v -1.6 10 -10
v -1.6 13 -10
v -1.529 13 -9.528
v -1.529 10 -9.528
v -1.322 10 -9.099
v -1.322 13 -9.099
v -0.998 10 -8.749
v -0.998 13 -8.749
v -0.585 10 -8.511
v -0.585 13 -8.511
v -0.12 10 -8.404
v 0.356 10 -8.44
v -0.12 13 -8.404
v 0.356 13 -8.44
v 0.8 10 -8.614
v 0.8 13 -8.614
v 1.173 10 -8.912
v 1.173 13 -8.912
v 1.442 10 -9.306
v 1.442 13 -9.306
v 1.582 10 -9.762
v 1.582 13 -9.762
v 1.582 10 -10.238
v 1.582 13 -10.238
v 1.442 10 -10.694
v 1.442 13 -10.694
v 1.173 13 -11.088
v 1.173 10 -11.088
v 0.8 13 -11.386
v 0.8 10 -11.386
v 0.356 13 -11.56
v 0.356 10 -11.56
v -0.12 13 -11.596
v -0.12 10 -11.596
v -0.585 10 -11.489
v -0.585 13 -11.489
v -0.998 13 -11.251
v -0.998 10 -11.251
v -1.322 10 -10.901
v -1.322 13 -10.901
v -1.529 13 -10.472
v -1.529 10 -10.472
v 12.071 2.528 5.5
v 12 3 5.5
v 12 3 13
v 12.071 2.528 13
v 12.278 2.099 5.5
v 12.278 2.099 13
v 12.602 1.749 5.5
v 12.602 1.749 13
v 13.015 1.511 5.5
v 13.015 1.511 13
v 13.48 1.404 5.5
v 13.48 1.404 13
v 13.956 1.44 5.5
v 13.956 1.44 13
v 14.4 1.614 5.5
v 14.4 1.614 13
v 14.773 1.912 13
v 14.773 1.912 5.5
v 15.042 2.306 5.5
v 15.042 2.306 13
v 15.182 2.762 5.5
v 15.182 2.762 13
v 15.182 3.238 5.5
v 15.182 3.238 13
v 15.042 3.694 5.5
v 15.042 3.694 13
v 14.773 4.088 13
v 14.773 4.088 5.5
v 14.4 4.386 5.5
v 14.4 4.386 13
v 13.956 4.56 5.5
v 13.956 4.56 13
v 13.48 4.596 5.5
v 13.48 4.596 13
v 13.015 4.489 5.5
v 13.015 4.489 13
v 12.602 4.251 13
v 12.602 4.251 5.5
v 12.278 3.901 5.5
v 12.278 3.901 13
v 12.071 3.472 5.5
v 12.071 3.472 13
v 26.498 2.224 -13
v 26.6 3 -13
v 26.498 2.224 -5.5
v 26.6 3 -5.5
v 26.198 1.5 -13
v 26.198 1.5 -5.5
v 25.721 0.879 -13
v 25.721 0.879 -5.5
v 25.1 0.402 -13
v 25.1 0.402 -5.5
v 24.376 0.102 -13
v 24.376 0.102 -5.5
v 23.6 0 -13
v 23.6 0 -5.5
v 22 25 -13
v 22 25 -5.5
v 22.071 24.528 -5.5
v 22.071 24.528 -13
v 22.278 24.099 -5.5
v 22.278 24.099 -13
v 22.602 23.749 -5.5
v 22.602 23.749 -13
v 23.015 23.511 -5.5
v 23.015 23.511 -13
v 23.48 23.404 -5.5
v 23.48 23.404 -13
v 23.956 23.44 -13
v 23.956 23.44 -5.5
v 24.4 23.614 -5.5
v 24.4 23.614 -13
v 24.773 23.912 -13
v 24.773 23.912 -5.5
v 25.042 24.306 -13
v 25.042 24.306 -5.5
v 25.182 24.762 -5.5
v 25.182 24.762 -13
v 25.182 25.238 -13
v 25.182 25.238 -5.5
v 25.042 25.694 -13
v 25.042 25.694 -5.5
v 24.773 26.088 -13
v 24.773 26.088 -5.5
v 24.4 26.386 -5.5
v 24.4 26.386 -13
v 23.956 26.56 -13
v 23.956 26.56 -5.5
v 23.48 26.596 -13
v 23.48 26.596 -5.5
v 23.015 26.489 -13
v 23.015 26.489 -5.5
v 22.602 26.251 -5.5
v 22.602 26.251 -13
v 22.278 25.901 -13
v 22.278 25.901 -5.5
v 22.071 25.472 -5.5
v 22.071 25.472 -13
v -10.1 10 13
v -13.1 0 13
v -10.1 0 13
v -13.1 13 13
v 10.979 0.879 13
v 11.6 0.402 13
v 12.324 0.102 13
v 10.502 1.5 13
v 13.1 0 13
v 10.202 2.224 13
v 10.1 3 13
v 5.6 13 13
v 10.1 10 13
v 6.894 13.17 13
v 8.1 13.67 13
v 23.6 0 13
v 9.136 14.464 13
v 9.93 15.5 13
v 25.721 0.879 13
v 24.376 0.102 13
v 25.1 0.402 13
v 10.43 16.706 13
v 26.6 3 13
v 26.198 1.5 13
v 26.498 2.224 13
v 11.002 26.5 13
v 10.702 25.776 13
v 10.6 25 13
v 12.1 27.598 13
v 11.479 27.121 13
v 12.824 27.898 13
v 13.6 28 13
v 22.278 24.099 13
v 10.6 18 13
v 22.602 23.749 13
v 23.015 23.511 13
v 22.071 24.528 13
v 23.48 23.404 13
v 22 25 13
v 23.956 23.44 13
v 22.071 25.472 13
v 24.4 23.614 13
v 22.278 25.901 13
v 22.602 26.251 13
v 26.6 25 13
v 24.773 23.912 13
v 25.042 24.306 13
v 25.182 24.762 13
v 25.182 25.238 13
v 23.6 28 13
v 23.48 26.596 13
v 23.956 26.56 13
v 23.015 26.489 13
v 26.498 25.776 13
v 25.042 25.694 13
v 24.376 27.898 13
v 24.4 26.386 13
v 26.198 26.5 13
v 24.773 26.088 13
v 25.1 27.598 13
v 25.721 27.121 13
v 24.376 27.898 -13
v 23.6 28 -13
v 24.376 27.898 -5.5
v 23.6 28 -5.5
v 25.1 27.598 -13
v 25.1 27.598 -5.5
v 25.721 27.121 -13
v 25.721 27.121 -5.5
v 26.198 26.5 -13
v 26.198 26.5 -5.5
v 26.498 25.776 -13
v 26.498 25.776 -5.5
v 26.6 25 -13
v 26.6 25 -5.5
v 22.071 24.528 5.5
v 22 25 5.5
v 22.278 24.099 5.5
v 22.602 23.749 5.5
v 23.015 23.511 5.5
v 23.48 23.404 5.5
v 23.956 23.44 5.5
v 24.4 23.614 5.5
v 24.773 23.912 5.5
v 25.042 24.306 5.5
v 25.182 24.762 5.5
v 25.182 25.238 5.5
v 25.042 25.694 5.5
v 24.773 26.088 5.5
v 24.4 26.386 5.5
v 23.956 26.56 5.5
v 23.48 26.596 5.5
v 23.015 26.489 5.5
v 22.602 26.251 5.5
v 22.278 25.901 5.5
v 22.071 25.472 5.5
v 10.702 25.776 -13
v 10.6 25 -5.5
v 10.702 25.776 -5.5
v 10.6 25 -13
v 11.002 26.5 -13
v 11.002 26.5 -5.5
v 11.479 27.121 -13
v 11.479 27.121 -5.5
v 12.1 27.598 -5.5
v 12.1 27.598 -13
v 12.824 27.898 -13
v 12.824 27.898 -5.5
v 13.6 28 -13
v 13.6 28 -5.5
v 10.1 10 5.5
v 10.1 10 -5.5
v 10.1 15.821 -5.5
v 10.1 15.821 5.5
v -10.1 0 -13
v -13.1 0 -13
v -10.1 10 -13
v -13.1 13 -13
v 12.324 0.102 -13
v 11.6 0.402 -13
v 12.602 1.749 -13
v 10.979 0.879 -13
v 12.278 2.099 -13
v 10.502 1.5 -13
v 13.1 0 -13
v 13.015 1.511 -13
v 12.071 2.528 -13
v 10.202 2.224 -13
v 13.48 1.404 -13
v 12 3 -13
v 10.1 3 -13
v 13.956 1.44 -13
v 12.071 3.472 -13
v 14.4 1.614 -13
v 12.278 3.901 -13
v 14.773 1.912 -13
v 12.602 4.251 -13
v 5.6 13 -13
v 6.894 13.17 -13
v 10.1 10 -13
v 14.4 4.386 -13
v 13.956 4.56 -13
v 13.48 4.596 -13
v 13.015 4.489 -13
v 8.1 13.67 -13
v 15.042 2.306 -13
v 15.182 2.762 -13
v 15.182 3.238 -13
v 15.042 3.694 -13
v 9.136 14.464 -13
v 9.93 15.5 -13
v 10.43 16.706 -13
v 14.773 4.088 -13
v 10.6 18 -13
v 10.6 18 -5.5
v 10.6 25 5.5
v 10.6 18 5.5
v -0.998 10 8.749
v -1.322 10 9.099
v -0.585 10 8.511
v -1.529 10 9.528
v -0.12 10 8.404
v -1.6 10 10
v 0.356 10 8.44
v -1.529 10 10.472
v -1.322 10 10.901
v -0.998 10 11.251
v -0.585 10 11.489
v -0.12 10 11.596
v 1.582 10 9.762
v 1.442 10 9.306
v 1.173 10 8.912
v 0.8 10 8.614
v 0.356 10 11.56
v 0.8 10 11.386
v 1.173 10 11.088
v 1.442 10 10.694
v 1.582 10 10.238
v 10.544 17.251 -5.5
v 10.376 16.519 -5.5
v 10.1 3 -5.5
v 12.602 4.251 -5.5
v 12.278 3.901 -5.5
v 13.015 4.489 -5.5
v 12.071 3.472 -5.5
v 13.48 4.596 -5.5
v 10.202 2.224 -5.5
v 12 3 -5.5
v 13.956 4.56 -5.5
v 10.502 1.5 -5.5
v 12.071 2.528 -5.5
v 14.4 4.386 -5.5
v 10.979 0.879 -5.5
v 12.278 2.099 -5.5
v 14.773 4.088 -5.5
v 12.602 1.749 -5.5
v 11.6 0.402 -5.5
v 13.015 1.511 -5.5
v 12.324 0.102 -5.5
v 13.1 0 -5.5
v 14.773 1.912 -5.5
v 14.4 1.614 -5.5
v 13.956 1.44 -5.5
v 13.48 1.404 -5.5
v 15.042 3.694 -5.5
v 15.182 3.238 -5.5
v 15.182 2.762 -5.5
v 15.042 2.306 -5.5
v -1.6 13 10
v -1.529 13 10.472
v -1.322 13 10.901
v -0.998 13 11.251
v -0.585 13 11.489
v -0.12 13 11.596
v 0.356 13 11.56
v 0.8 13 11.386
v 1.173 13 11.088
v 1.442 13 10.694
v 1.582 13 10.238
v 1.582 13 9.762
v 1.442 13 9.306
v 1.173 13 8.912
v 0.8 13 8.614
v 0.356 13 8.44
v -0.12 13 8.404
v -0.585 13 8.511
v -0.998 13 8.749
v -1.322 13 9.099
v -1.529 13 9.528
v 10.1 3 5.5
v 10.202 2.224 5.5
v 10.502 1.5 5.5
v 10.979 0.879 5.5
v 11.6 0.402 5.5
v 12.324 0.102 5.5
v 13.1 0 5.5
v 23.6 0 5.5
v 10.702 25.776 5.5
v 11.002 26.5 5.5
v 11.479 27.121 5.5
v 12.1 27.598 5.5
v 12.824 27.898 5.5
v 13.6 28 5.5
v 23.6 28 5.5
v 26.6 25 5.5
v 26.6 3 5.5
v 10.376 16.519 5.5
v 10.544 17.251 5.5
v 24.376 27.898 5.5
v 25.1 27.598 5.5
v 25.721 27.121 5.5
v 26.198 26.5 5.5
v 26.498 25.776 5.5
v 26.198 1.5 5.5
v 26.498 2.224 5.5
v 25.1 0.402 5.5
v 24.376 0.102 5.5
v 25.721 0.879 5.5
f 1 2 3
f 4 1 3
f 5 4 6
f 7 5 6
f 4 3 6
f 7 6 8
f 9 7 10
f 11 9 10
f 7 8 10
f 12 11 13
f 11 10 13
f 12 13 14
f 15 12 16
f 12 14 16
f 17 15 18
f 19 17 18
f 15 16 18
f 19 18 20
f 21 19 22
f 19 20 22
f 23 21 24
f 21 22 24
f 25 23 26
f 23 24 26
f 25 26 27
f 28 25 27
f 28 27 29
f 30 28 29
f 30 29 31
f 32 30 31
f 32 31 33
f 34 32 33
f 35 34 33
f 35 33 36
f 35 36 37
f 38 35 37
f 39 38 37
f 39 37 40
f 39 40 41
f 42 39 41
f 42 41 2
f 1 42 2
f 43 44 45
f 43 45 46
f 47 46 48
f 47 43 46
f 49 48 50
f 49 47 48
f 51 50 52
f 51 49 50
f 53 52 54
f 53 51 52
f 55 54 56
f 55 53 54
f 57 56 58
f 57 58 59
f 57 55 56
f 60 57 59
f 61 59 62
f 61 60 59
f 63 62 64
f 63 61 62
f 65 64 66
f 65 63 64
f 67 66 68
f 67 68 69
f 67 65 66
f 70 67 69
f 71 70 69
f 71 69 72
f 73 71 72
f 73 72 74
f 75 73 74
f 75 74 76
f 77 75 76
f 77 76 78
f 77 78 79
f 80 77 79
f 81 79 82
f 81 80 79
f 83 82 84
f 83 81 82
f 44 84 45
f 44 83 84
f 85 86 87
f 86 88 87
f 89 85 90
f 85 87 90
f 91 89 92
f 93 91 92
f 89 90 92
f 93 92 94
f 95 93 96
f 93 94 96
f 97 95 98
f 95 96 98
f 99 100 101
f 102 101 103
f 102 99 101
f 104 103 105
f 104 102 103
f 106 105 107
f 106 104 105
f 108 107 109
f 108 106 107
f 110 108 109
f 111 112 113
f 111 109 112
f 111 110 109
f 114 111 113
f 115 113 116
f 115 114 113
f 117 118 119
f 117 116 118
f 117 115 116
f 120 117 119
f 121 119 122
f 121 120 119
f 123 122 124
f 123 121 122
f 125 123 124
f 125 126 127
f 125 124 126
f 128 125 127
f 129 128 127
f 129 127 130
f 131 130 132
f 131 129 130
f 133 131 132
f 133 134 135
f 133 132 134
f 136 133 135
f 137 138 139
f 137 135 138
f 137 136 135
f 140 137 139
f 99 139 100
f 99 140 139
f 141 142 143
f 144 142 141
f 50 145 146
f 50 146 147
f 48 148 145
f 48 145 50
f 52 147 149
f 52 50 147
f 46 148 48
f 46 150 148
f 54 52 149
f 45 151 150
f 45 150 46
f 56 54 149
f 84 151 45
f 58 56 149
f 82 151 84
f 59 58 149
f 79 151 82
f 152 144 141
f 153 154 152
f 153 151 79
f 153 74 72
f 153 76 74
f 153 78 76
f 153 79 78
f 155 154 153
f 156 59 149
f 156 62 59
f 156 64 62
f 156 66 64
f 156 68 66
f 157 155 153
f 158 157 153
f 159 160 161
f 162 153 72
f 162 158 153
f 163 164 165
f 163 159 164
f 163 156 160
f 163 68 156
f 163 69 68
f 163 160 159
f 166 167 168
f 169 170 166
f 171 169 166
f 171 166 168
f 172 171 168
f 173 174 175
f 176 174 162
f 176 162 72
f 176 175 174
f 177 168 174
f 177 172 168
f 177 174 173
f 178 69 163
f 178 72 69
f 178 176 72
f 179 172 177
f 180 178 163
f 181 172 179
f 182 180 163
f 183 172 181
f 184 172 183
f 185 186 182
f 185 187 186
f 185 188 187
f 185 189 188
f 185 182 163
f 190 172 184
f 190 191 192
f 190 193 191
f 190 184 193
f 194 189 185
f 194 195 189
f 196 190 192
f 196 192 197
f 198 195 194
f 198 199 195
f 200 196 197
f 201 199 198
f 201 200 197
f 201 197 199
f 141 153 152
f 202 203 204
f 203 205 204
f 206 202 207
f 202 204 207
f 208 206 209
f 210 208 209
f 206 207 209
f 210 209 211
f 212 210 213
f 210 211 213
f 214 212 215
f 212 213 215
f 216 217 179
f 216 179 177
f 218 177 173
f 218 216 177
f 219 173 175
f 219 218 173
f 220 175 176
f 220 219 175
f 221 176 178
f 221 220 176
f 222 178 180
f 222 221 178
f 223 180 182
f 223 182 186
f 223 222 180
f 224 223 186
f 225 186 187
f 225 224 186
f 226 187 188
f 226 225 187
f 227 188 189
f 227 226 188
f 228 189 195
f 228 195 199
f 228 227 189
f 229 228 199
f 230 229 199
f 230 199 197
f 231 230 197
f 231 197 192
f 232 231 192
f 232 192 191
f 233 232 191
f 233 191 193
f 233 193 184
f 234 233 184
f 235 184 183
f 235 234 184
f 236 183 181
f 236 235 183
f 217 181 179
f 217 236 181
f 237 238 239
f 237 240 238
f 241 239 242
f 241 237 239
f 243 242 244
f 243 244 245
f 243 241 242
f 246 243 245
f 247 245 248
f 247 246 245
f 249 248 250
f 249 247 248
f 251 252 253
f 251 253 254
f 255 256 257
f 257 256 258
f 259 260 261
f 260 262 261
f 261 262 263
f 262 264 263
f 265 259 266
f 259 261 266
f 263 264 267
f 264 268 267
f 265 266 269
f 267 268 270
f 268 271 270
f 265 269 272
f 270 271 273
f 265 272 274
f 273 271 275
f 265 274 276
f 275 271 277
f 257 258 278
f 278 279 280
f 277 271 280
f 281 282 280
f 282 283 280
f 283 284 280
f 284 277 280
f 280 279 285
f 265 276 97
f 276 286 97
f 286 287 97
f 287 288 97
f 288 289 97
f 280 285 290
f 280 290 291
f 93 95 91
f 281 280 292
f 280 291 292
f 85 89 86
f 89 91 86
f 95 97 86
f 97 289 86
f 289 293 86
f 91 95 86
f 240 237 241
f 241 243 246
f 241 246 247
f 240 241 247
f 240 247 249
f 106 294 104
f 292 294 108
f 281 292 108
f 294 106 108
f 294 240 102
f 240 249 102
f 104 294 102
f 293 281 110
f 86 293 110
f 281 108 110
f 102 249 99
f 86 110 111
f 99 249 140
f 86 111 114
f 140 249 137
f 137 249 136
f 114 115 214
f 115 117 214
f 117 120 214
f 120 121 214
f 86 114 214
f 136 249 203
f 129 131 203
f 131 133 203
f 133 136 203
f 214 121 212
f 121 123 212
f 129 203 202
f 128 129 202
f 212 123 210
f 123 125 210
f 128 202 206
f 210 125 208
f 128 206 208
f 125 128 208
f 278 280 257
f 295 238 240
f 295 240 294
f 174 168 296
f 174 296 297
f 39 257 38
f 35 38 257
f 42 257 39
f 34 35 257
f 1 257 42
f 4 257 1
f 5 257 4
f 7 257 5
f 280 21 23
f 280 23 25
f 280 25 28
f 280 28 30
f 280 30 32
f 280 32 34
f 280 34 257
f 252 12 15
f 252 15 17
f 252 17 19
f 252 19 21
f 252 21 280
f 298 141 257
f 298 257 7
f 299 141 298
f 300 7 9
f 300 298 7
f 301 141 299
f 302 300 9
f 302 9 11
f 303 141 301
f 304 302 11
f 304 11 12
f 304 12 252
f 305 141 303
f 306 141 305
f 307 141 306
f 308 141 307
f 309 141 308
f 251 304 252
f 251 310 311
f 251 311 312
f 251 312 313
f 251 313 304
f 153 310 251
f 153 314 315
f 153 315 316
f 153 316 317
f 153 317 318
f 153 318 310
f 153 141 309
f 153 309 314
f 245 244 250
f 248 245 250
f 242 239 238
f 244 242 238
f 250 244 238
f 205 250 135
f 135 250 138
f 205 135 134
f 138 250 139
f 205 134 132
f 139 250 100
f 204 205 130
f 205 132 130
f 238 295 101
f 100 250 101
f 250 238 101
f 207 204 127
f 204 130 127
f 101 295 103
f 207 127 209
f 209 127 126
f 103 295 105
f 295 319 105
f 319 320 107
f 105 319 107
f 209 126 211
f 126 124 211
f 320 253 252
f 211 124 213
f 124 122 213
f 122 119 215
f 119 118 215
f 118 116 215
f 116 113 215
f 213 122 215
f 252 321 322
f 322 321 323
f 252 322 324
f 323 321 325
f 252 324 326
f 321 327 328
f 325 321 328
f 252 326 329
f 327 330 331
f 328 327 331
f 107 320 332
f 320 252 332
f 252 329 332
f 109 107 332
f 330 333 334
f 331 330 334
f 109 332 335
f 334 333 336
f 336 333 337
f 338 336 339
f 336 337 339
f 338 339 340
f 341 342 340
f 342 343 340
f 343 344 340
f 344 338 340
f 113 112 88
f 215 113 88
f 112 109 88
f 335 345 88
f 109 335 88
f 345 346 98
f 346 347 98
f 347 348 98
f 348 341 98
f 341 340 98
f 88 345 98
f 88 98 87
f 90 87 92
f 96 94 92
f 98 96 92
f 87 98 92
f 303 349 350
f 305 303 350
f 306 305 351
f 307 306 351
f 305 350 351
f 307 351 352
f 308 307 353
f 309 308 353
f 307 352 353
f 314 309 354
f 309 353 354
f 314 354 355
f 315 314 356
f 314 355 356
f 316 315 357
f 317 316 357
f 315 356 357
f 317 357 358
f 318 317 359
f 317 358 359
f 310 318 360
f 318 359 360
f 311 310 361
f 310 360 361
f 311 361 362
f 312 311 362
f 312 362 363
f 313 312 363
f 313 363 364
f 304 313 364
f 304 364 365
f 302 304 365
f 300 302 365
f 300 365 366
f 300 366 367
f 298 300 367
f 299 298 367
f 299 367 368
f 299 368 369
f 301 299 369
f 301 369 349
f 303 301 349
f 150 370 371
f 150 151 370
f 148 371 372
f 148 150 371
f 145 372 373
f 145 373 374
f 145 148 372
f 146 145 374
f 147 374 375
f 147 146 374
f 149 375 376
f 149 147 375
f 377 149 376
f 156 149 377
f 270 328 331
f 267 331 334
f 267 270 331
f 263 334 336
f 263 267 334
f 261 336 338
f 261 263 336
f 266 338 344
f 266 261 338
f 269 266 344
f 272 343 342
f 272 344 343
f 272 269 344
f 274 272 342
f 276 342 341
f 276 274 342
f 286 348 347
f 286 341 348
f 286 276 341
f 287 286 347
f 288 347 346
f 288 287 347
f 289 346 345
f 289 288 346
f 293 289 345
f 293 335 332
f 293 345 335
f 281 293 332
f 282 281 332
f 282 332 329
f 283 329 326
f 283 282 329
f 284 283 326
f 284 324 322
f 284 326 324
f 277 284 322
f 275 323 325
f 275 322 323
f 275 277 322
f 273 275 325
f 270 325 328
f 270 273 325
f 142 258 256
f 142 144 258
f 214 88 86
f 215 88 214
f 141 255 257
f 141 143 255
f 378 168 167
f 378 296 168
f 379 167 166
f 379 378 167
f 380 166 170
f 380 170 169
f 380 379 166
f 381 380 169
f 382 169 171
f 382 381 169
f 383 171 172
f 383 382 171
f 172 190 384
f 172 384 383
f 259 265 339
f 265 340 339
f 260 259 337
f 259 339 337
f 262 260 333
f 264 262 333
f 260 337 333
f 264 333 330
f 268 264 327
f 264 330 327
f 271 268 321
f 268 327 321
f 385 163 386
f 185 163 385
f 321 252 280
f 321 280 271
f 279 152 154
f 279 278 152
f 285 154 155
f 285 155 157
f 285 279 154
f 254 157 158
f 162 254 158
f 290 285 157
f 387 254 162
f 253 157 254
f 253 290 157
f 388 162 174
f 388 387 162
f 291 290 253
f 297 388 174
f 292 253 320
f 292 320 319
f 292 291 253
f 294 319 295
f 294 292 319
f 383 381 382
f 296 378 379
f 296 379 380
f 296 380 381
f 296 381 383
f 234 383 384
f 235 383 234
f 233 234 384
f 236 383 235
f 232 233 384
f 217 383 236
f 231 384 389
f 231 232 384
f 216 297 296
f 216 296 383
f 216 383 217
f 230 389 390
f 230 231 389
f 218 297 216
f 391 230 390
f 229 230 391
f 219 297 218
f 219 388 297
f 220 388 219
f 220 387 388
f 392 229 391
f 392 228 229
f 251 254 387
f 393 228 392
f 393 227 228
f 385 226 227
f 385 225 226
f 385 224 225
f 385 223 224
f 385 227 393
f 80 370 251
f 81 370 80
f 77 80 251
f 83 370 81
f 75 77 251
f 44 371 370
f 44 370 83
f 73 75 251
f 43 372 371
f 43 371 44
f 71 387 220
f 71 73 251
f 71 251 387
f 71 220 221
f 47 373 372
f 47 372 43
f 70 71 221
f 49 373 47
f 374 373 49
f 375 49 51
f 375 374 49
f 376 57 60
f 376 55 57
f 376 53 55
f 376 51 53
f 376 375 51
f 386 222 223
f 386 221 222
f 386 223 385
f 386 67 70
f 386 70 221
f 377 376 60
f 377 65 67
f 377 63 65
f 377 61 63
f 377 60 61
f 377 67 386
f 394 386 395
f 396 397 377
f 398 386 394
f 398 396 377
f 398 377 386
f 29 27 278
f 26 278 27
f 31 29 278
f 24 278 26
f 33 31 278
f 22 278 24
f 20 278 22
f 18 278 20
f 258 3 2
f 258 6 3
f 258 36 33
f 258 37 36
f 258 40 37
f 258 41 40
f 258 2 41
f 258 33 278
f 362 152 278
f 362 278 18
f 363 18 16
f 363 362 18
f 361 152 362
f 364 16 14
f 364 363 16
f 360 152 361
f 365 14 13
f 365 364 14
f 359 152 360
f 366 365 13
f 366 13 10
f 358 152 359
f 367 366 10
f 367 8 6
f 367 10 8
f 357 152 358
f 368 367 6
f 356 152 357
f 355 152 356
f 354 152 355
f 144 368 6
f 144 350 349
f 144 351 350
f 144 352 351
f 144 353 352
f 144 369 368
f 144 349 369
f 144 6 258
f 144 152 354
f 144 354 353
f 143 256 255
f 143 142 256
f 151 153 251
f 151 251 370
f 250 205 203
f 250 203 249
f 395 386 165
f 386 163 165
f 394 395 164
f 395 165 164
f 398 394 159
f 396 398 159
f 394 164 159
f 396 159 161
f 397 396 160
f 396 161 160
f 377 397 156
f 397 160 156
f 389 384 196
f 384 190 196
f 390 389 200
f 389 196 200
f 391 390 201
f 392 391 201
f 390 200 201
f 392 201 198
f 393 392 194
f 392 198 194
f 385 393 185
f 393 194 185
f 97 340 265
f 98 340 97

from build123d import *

# Parameters (mm, degrees)
SKETCH_1_R          = 1.6
EXTRUDE_1_DEPTH     = 13
SKETCH_2_W          = 16.5
SKETCH_2_H          = 11
CUT_EXTRUDE_1_DEPTH = 41.749969325
SKETCH_3_R          = 1.6
CUT_EXTRUDE_2_DEPTH = 34.189757456
FILLET_2_R          = 5
FILLET_3_R          = 3


with BuildPart() as part:
    # 草图1 → 凸台-拉伸1 (new, symmetric)
    with BuildSketch(Plane.XY):
        Polygon((-10.1, 0), (-10.1, 10), (10.1, 10), (10.1, 0), (13.1, 0), (26.6, 0), (26.6, 28), (10.6, 28), (10.6, 13), (-13.1, 13), (-13.1, 0), align=None)
        with Locations(Location((23.6, 25, 0), (0, 0, 180))):
            Circle(SKETCH_1_R, mode=Mode.SUBTRACT)
        with Locations(Location((13.6, 3, 0), (0, 0, 180))):
            Circle(SKETCH_1_R, mode=Mode.SUBTRACT)
    extrude(amount=EXTRUDE_1_DEPTH, both=True)

    # 草图2 → 切除-拉伸1 (cut, through all)
    with BuildSketch(Plane.XZ):
        with Locations((18.35, 0)):
            Rectangle(SKETCH_2_W, SKETCH_2_H)
    extrude(amount=-CUT_EXTRUDE_1_DEPTH, mode=Mode.SUBTRACT)

    # 草图3 → 切除-拉伸2 (cut, through all)
    with BuildSketch(Plane(origin=(0, 13, 0), x_dir=(1, 0, 0), z_dir=(0, 1, 0))):
        with Locations(Location((0, 10, 0), (0, 0, 180))):
            Circle(SKETCH_3_R)
        with Locations(Location((0, -10, 0), (0, 0, 180))):
            Circle(SKETCH_3_R)
    extrude(amount=-CUT_EXTRUDE_2_DEPTH, mode=Mode.SUBTRACT)

    # 圆角2
    fillet_2_edges = [part.edges().sort_by_distance(p)[0] for p in [
        (10.6, 13, -9.25),
    ]]
    fillet(fillet_2_edges, radius=FILLET_2_R)

    # 圆角3
    fillet_3_edges = [part.edges().sort_by_distance(p)[0] for p in [
        (10.6, 28, 9.25),
        (26.6, 28, 9.25),
        (26.6, 0, 9.25),
        (10.1, 0, 9.25),
        (10.6, 28, -9.25),
        (26.6, 28, -9.25),
        (26.6, 0, -9.25),
        (10.1, 0, -9.25),
    ]]
    fillet(fillet_3_edges, radius=FILLET_3_R)


solid = part.part
